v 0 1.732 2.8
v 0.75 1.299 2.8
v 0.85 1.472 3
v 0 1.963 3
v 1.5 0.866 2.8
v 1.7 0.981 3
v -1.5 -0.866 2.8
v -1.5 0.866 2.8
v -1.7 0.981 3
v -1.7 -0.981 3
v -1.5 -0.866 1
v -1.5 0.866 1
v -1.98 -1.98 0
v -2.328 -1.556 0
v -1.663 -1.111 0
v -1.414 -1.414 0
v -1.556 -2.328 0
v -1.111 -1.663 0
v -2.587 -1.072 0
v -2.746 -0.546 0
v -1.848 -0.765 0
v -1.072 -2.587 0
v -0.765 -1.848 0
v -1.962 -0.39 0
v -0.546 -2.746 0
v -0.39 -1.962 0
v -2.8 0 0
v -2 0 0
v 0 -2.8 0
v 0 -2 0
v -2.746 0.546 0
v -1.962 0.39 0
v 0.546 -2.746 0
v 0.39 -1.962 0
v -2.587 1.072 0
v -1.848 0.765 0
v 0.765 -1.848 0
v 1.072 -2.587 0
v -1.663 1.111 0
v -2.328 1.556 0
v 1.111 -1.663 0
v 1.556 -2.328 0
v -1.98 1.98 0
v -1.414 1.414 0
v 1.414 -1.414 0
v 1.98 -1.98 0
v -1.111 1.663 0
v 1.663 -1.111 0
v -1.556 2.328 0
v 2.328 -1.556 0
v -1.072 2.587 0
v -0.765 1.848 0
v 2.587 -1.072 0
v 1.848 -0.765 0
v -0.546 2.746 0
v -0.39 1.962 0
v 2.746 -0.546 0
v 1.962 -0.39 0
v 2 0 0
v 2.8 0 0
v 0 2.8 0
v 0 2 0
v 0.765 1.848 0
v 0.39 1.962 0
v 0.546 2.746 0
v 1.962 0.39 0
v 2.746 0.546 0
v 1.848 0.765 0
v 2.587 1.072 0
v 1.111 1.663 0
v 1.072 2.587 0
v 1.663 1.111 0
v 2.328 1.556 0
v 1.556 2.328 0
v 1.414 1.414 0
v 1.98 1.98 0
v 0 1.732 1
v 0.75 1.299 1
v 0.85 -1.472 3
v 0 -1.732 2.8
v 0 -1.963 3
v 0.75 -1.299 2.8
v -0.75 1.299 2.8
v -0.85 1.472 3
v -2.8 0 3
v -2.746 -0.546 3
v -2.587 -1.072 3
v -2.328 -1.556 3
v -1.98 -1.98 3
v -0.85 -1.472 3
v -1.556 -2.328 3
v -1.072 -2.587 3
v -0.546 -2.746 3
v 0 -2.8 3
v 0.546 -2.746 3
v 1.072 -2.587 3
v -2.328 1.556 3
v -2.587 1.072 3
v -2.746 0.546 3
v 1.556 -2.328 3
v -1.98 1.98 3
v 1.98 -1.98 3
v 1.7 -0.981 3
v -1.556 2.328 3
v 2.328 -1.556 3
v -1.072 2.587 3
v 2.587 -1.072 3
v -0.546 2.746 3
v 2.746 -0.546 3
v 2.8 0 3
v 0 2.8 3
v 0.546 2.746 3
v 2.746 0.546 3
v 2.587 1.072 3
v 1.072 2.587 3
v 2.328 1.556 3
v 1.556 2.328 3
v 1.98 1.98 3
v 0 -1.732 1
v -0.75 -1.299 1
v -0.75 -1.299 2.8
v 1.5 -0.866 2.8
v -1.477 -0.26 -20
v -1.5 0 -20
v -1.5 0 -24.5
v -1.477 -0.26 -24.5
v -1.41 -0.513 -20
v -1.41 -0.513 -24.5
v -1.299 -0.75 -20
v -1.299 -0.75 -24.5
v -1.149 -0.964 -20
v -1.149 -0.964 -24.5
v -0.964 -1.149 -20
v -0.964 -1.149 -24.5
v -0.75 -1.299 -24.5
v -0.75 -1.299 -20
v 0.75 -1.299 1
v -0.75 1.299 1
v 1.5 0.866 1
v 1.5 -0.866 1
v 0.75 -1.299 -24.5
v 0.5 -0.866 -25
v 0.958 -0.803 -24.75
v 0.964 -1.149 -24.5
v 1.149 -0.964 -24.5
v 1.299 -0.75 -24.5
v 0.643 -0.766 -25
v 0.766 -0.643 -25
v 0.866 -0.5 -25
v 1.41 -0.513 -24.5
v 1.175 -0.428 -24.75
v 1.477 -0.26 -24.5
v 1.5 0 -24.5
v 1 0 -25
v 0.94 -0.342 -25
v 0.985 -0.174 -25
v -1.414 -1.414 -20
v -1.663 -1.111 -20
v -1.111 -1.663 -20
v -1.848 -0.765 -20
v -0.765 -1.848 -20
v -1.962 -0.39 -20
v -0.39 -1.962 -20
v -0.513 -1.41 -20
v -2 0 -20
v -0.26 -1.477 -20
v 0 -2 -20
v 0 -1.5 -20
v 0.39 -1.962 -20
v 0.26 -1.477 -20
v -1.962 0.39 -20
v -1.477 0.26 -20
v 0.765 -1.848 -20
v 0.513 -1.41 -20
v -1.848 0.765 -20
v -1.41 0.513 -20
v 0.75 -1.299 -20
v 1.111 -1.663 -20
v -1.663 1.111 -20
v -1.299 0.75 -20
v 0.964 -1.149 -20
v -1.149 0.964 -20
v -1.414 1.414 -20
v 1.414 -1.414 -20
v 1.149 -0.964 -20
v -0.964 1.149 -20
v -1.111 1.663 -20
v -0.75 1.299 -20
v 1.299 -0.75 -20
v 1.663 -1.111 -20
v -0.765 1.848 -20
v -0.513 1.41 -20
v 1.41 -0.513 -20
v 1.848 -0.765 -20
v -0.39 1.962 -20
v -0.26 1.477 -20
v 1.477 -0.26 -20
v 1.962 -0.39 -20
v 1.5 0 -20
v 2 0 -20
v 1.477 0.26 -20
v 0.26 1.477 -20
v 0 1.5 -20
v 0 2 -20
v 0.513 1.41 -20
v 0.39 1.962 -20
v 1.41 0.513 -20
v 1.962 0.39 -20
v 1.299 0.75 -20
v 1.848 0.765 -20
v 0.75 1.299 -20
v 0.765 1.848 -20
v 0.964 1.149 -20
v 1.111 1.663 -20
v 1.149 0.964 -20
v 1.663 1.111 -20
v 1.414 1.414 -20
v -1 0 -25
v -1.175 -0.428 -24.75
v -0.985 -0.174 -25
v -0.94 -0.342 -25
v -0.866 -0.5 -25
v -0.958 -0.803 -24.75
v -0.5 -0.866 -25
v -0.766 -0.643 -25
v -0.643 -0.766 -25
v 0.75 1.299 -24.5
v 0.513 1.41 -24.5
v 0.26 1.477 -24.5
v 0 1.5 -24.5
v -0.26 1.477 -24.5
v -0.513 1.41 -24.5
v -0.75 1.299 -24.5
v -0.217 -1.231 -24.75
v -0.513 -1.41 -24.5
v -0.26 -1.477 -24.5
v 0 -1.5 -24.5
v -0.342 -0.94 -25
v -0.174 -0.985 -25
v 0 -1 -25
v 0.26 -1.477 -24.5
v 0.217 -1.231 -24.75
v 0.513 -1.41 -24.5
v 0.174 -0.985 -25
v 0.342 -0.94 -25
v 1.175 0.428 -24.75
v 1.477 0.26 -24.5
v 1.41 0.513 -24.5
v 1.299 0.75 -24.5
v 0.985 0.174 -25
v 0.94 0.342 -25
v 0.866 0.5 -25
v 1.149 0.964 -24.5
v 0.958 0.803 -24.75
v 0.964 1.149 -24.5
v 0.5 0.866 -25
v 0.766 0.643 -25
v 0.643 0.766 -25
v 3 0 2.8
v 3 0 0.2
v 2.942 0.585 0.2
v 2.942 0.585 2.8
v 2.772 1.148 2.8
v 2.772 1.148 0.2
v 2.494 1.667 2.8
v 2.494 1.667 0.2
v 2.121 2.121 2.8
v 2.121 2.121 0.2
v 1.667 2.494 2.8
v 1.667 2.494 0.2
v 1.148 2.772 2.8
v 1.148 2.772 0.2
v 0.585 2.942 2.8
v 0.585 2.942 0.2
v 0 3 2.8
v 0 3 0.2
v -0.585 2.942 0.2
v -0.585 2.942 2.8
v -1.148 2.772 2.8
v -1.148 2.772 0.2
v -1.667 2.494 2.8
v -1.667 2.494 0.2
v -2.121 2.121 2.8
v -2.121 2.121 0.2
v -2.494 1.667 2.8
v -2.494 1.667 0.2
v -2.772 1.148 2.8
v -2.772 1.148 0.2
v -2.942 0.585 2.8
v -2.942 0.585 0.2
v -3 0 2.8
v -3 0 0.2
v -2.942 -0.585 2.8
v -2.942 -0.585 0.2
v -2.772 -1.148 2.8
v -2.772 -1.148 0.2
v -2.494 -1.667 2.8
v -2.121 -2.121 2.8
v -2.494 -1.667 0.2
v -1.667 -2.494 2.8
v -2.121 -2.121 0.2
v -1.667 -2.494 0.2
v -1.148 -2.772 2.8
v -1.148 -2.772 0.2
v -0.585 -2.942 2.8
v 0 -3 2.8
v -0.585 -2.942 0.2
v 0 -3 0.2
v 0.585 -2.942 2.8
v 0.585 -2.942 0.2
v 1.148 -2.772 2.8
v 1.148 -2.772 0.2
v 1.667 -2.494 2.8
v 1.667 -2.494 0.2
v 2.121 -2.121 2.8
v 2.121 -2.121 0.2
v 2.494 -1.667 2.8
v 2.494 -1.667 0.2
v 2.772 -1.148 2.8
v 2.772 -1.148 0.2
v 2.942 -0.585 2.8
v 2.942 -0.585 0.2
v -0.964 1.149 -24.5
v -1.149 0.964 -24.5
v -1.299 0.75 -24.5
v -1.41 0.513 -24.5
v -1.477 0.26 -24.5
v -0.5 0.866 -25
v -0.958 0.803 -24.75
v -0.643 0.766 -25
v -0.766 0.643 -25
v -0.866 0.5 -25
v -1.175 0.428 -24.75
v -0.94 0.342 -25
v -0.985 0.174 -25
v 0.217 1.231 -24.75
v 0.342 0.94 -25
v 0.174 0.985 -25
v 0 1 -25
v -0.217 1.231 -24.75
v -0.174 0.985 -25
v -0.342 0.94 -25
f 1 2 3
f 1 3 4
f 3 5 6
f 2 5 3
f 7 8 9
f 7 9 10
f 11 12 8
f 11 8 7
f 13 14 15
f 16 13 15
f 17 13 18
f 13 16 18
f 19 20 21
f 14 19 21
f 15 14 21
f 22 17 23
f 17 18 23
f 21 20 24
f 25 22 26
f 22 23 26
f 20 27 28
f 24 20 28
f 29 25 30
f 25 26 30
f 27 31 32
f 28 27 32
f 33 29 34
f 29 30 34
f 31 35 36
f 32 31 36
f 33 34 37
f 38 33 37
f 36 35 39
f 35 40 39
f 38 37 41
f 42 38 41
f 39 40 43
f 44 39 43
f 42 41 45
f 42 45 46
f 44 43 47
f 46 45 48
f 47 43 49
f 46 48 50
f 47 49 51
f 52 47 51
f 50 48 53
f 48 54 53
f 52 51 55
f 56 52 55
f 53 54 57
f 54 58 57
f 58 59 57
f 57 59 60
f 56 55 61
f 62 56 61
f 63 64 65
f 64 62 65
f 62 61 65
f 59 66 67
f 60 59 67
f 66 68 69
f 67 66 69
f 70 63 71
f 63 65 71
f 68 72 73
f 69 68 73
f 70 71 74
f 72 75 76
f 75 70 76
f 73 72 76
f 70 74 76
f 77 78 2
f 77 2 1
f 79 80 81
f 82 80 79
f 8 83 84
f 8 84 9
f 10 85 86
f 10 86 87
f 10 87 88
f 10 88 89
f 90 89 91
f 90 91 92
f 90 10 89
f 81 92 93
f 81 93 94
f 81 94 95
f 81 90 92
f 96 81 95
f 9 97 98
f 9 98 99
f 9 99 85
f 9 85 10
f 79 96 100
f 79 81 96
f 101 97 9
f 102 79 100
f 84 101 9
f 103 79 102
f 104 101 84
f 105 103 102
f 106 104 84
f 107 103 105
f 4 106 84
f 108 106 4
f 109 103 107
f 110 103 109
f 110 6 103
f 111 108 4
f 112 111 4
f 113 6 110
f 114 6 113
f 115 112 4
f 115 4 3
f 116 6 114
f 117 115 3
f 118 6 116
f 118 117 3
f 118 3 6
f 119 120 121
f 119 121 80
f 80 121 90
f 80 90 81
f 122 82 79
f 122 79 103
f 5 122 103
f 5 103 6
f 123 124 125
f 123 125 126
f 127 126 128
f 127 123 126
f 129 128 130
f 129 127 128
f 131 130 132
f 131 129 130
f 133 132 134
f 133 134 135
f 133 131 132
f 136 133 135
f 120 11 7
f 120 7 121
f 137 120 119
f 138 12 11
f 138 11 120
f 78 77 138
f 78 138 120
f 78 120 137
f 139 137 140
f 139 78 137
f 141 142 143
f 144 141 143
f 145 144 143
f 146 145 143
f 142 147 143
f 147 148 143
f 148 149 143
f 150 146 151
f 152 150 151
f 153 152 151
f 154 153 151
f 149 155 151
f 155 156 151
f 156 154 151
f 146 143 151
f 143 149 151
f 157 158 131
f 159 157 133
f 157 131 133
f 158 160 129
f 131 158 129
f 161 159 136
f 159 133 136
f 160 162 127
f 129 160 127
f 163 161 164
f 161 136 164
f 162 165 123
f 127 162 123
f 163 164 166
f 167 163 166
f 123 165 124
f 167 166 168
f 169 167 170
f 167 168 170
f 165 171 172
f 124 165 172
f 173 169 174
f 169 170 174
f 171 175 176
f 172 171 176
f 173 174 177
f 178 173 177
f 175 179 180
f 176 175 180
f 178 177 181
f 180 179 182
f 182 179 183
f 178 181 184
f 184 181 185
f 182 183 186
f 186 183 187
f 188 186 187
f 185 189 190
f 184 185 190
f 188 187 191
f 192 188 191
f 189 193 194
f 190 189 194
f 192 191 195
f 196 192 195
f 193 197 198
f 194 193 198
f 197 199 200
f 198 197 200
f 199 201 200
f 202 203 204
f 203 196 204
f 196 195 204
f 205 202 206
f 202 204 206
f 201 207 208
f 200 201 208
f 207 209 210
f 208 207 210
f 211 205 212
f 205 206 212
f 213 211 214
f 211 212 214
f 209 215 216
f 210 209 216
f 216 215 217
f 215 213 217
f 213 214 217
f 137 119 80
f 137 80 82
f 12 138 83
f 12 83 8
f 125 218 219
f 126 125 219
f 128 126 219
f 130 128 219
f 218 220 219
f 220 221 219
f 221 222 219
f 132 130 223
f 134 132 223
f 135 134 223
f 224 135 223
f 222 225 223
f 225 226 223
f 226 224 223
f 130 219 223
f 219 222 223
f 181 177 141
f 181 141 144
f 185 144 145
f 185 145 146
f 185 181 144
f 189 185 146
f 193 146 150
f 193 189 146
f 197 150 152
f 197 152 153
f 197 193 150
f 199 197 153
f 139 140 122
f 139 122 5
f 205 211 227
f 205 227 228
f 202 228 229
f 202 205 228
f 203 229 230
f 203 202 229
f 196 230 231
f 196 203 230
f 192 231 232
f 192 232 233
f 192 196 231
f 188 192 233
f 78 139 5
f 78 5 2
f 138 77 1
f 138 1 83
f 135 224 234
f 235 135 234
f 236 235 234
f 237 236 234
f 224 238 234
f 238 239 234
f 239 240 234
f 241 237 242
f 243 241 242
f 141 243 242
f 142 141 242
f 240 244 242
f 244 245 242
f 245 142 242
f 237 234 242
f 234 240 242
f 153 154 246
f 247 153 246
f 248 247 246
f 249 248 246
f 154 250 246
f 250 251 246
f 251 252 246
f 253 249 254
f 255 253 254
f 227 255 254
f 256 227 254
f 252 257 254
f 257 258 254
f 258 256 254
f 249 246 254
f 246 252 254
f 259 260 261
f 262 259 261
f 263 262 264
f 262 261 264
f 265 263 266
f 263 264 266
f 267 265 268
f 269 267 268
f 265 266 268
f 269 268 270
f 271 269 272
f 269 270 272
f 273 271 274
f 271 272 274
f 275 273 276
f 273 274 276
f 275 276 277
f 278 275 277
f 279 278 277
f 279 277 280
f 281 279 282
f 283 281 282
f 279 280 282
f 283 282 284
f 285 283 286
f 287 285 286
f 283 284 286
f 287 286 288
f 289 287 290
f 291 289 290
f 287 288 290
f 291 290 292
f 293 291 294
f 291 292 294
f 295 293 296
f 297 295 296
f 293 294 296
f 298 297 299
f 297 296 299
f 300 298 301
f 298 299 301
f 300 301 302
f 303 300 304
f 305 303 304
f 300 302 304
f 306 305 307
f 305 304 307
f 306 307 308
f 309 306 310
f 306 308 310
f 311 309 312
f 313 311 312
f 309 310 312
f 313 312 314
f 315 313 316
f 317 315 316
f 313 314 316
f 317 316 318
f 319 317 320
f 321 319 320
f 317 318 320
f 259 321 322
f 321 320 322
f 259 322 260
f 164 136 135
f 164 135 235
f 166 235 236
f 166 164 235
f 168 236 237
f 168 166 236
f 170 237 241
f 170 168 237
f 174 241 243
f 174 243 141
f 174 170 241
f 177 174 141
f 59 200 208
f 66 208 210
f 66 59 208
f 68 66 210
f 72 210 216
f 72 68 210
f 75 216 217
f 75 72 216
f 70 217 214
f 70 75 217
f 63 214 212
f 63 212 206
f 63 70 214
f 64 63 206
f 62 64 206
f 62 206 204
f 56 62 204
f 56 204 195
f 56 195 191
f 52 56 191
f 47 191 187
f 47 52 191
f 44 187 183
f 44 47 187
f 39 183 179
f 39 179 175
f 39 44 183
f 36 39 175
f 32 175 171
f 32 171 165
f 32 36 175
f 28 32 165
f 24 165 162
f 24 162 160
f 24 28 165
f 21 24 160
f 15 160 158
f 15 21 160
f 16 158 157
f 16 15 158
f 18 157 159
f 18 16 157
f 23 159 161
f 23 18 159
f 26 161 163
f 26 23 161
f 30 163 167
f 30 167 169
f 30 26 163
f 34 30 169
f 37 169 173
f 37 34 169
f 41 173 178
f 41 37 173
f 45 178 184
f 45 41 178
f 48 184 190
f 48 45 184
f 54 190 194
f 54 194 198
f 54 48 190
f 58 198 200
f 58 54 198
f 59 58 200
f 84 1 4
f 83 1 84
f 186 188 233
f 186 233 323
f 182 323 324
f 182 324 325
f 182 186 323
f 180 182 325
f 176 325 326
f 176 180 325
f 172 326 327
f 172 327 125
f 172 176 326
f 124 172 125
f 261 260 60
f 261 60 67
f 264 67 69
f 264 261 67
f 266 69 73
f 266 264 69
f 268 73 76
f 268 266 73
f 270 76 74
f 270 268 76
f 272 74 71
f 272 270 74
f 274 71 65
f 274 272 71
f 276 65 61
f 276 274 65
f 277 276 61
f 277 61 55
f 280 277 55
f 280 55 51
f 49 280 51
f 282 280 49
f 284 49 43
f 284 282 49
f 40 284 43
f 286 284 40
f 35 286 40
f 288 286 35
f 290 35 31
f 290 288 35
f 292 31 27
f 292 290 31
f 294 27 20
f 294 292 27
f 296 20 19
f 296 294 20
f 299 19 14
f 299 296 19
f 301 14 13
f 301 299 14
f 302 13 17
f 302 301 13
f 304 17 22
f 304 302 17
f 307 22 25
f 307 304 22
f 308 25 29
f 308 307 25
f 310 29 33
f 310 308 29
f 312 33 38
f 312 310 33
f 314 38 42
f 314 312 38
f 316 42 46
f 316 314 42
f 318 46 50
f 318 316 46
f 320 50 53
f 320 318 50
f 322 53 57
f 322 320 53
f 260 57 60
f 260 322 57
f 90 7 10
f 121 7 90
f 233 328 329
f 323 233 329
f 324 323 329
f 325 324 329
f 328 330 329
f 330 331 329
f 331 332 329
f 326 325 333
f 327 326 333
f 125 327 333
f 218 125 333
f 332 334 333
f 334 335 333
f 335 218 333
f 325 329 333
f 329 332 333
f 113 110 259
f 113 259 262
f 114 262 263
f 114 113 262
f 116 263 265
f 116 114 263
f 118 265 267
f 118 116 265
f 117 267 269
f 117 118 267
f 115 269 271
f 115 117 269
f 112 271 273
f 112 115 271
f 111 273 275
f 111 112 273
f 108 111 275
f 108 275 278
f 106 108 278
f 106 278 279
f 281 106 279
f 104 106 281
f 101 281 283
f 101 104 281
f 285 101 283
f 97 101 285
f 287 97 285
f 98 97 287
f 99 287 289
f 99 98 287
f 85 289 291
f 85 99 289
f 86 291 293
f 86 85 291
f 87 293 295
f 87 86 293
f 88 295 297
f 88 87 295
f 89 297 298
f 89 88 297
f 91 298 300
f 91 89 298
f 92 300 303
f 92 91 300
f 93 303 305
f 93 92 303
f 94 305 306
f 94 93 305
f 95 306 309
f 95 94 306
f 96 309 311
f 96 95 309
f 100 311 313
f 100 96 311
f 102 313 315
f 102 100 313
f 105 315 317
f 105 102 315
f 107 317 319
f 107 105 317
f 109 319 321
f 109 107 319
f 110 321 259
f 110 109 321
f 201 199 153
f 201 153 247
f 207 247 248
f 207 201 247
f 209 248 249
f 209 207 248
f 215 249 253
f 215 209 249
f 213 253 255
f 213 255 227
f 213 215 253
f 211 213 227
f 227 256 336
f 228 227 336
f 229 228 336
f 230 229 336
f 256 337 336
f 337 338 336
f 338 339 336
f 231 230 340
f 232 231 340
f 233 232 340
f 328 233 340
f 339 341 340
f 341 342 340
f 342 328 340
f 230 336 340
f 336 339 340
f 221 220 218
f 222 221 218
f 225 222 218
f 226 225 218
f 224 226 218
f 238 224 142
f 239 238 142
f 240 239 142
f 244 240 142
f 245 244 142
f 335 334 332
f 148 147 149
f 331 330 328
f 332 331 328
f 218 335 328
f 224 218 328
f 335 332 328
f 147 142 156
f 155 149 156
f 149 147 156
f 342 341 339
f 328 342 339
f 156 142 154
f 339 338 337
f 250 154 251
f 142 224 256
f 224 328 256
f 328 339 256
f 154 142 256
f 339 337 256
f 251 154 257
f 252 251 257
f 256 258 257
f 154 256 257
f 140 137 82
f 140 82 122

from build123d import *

# Parameters (mm, degrees)
F0_R     = 3
F0_R_2   = 2
F1_DEPTH = 3
F2_DEPTH = 20
F3_DEPTH = 25
F4_START = 1
F4_DEPTH = 2
F5_SIZE  = 0.2
F6_SIZE  = 0.5


with BuildPart() as f1:
    # F0 (on Top) → F1 (new body)
    with BuildSketch(Plane.XY):
        Circle(F0_R)
        Circle(F0_R_2, mode=Mode.SUBTRACT)
        Circle(F0_R_2)
        Polygon((1.5, 0.8660254038), (1.5, 0), (1.5, -0.8660254038), (0.7499999928, -1.2990381098), (0, -1.7320508076), (-0.7499999928, -1.2990381098), (-1.5, -0.8660254038), (-1.5, 0), (-1.5, 0.8660254038), (-0.7499999928, 1.2990381098), (0, 1.7320508076), (0.7499999928, 1.2990381098), align=None, mode=Mode.SUBTRACT)
        with BuildLine():
            ThreePointArc((0.7499999928, -1.2990381098), (1.2990381036, -0.7500000036), (1.5, 0))
            ThreePointArc((1.5, 0), (1.2990381036, 0.7500000036), (0.7499999928, 1.2990381098))
            ThreePointArc((0.7499999928, 1.2990381098), (0, 1.5), (-0.7499999928, 1.2990381098))
            ThreePointArc((-0.7499999928, 1.2990381098), (-1.2990381036, 0.7500000036), (-1.5, 0))
            ThreePointArc((-1.5, 0), (-1.2990381036, -0.7500000036), (-0.7499999928, -1.2990381098))
            ThreePointArc((-0.7499999928, -1.2990381098), (0, -1.5), (0.7499999928, -1.2990381098))
        make_face()
        with BuildLine():
            Line((0, -1.7320508076), (0.7499999928, -1.2990381098))
            ThreePointArc((0.7499999928, -1.2990381098), (0, -1.5), (-0.7499999928, -1.2990381098))
            Line((-0.7499999928, -1.2990381098), (0, -1.7320508076))
        make_face()
        with BuildLine():
            Line((1.5, -0.8660254038), (1.5, 0))
            ThreePointArc((1.5, 0), (1.2990381036, -0.7500000036), (0.7499999928, -1.2990381098))
            Line((0.7499999928, -1.2990381098), (1.5, -0.8660254038))
        make_face()
        with BuildLine():
            ThreePointArc((0.7499999928, 1.2990381098), (1.2990381036, 0.7500000036), (1.5, 0))
            Line((1.5, 0), (1.5, 0.8660254038))
            Line((1.5, 0.8660254038), (0.7499999928, 1.2990381098))
        make_face()
        with BuildLine():
            ThreePointArc((-0.7499999928, 1.2990381098), (0, 1.5), (0.7499999928, 1.2990381098))
            Line((0.7499999928, 1.2990381098), (0, 1.7320508076))
            Line((0, 1.7320508076), (-0.7499999928, 1.2990381098))
        make_face()
        with BuildLine():
            ThreePointArc((-1.5, 0), (-1.2990381036, 0.7500000036), (-0.7499999928, 1.2990381098))
            Line((-0.7499999928, 1.2990381098), (-1.5, 0.8660254038))
            Line((-1.5, 0.8660254038), (-1.5, 0))
        make_face()
        with BuildLine():
            Line((-1.5, -0.8660254038), (-0.7499999928, -1.2990381098))
            ThreePointArc((-0.7499999928, -1.2990381098), (-1.2990381036, -0.7500000036), (-1.5, 0))
            Line((-1.5, 0), (-1.5, -0.8660254038))
        make_face()
    extrude(amount=F1_DEPTH)

    # F0 (on Top) → F2 (join)
    with BuildSketch(Plane.XY):
        Circle(F0_R_2)
        Polygon((1.5, 0.8660254038), (1.5, 0), (1.5, -0.8660254038), (0.7499999928, -1.2990381098), (0, -1.7320508076), (-0.7499999928, -1.2990381098), (-1.5, -0.8660254038), (-1.5, 0), (-1.5, 0.8660254038), (-0.7499999928, 1.2990381098), (0, 1.7320508076), (0.7499999928, 1.2990381098), align=None, mode=Mode.SUBTRACT)
        with BuildLine():
            ThreePointArc((0.7499999928, -1.2990381098), (1.2990381036, -0.7500000036), (1.5, 0))
            ThreePointArc((1.5, 0), (1.2990381036, 0.7500000036), (0.7499999928, 1.2990381098))
            ThreePointArc((0.7499999928, 1.2990381098), (0, 1.5), (-0.7499999928, 1.2990381098))
            ThreePointArc((-0.7499999928, 1.2990381098), (-1.2990381036, 0.7500000036), (-1.5, 0))
            ThreePointArc((-1.5, 0), (-1.2990381036, -0.7500000036), (-0.7499999928, -1.2990381098))
            ThreePointArc((-0.7499999928, -1.2990381098), (0, -1.5), (0.7499999928, -1.2990381098))
        make_face()
        with BuildLine():
            Line((0, -1.7320508076), (0.7499999928, -1.2990381098))
            ThreePointArc((0.7499999928, -1.2990381098), (0, -1.5), (-0.7499999928, -1.2990381098))
            Line((-0.7499999928, -1.2990381098), (0, -1.7320508076))
        make_face()
        with BuildLine():
            Line((1.5, -0.8660254038), (1.5, 0))
            ThreePointArc((1.5, 0), (1.2990381036, -0.7500000036), (0.7499999928, -1.2990381098))
            Line((0.7499999928, -1.2990381098), (1.5, -0.8660254038))
        make_face()
        with BuildLine():
            ThreePointArc((0.7499999928, 1.2990381098), (1.2990381036, 0.7500000036), (1.5, 0))
            Line((1.5, 0), (1.5, 0.8660254038))
            Line((1.5, 0.8660254038), (0.7499999928, 1.2990381098))
        make_face()
        with BuildLine():
            ThreePointArc((-0.7499999928, 1.2990381098), (0, 1.5), (0.7499999928, 1.2990381098))
            Line((0.7499999928, 1.2990381098), (0, 1.7320508076))
            Line((0, 1.7320508076), (-0.7499999928, 1.2990381098))
        make_face()
        with BuildLine():
            ThreePointArc((-1.5, 0), (-1.2990381036, 0.7500000036), (-0.7499999928, 1.2990381098))
            Line((-0.7499999928, 1.2990381098), (-1.5, 0.8660254038))
            Line((-1.5, 0.8660254038), (-1.5, 0))
        make_face()
        with BuildLine():
            Line((-1.5, -0.8660254038), (-0.7499999928, -1.2990381098))
            ThreePointArc((-0.7499999928, -1.2990381098), (-1.2990381036, -0.7500000036), (-1.5, 0))
            Line((-1.5, 0), (-1.5, -0.8660254038))
        make_face()
    extrude(amount=-F2_DEPTH)

    # F0 (on Top) → F3 (join)
    with BuildSketch(Plane.XY):
        with BuildLine():
            ThreePointArc((0.7499999928, -1.2990381098), (1.2990381036, -0.7500000036), (1.5, 0))
            ThreePointArc((1.5, 0), (1.2990381036, 0.7500000036), (0.7499999928, 1.2990381098))
            ThreePointArc((0.7499999928, 1.2990381098), (0, 1.5), (-0.7499999928, 1.2990381098))
            ThreePointArc((-0.7499999928, 1.2990381098), (-1.2990381036, 0.7500000036), (-1.5, 0))
            ThreePointArc((-1.5, 0), (-1.2990381036, -0.7500000036), (-0.7499999928, -1.2990381098))
            ThreePointArc((-0.7499999928, -1.2990381098), (0, -1.5), (0.7499999928, -1.2990381098))
        make_face()
    extrude(amount=-F3_DEPTH)

    # F0 (on Top) → F4 (cut)
    with BuildSketch(Plane.XY.offset(F4_START)):
        with BuildLine():
            ThreePointArc((0.7499999928, -1.2990381098), (1.2990381036, -0.7500000036), (1.5, 0))
            ThreePointArc((1.5, 0), (1.2990381036, 0.7500000036), (0.7499999928, 1.2990381098))
            ThreePointArc((0.7499999928, 1.2990381098), (0, 1.5), (-0.7499999928, 1.2990381098))
            ThreePointArc((-0.7499999928, 1.2990381098), (-1.2990381036, 0.7500000036), (-1.5, 0))
            ThreePointArc((-1.5, 0), (-1.2990381036, -0.7500000036), (-0.7499999928, -1.2990381098))
            ThreePointArc((-0.7499999928, -1.2990381098), (0, -1.5), (0.7499999928, -1.2990381098))
        make_face()
        with BuildLine():
            ThreePointArc((-0.7499999928, 1.2990381098), (0, 1.5), (0.7499999928, 1.2990381098))
            Line((0.7499999928, 1.2990381098), (0, 1.7320508076))
            Line((0, 1.7320508076), (-0.7499999928, 1.2990381098))
        make_face()
        with BuildLine():
            ThreePointArc((0.7499999928, 1.2990381098), (1.2990381036, 0.7500000036), (1.5, 0))
            Line((1.5, 0), (1.5, 0.8660254038))
            Line((1.5, 0.8660254038), (0.7499999928, 1.2990381098))
        make_face()
        with BuildLine():
            Line((1.5, -0.8660254038), (1.5, 0))
            ThreePointArc((1.5, 0), (1.2990381036, -0.7500000036), (0.7499999928, -1.2990381098))
            Line((0.7499999928, -1.2990381098), (1.5, -0.8660254038))
        make_face()
        with BuildLine():
            Line((0, -1.7320508076), (0.7499999928, -1.2990381098))
            ThreePointArc((0.7499999928, -1.2990381098), (0, -1.5), (-0.7499999928, -1.2990381098))
            Line((-0.7499999928, -1.2990381098), (0, -1.7320508076))
        make_face()
        with BuildLine():
            ThreePointArc((-1.5, 0), (-1.2990381036, 0.7500000036), (-0.7499999928, 1.2990381098))
            Line((-0.7499999928, 1.2990381098), (-1.5, 0.8660254038))
            Line((-1.5, 0.8660254038), (-1.5, 0))
        make_face()
        with BuildLine():
            Line((-1.5, -0.8660254038), (-0.7499999928, -1.2990381098))
            ThreePointArc((-0.7499999928, -1.2990381098), (-1.2990381036, -0.7500000036), (-1.5, 0))
            Line((-1.5, 0), (-1.5, -0.8660254038))
        make_face()
    extrude(amount=F4_DEPTH, mode=Mode.SUBTRACT)

    # F5
    f5_edges = [f1.edges().sort_by_distance(p)[0] for p in [
        (-3, 0, 3),
        (-0.75, 1.299038, 3),
        (0.75, 1.299038, 3),
        (1.5, 0, 3),
        (0.75, -1.299038, 3),
        (-1.5, 0, 3),
        (-0.75, -1.299038, 3),
        (-3, 0, 0),
    ]]
    chamfer(f5_edges, length=F5_SIZE)

    # F6
    f6_edges = [f1.edges().sort_by_distance(p)[0] for p in [
        (0.75, -1.299038, -25),
    ]]
    chamfer(f6_edges, length=F6_SIZE)


solid = f1.part
